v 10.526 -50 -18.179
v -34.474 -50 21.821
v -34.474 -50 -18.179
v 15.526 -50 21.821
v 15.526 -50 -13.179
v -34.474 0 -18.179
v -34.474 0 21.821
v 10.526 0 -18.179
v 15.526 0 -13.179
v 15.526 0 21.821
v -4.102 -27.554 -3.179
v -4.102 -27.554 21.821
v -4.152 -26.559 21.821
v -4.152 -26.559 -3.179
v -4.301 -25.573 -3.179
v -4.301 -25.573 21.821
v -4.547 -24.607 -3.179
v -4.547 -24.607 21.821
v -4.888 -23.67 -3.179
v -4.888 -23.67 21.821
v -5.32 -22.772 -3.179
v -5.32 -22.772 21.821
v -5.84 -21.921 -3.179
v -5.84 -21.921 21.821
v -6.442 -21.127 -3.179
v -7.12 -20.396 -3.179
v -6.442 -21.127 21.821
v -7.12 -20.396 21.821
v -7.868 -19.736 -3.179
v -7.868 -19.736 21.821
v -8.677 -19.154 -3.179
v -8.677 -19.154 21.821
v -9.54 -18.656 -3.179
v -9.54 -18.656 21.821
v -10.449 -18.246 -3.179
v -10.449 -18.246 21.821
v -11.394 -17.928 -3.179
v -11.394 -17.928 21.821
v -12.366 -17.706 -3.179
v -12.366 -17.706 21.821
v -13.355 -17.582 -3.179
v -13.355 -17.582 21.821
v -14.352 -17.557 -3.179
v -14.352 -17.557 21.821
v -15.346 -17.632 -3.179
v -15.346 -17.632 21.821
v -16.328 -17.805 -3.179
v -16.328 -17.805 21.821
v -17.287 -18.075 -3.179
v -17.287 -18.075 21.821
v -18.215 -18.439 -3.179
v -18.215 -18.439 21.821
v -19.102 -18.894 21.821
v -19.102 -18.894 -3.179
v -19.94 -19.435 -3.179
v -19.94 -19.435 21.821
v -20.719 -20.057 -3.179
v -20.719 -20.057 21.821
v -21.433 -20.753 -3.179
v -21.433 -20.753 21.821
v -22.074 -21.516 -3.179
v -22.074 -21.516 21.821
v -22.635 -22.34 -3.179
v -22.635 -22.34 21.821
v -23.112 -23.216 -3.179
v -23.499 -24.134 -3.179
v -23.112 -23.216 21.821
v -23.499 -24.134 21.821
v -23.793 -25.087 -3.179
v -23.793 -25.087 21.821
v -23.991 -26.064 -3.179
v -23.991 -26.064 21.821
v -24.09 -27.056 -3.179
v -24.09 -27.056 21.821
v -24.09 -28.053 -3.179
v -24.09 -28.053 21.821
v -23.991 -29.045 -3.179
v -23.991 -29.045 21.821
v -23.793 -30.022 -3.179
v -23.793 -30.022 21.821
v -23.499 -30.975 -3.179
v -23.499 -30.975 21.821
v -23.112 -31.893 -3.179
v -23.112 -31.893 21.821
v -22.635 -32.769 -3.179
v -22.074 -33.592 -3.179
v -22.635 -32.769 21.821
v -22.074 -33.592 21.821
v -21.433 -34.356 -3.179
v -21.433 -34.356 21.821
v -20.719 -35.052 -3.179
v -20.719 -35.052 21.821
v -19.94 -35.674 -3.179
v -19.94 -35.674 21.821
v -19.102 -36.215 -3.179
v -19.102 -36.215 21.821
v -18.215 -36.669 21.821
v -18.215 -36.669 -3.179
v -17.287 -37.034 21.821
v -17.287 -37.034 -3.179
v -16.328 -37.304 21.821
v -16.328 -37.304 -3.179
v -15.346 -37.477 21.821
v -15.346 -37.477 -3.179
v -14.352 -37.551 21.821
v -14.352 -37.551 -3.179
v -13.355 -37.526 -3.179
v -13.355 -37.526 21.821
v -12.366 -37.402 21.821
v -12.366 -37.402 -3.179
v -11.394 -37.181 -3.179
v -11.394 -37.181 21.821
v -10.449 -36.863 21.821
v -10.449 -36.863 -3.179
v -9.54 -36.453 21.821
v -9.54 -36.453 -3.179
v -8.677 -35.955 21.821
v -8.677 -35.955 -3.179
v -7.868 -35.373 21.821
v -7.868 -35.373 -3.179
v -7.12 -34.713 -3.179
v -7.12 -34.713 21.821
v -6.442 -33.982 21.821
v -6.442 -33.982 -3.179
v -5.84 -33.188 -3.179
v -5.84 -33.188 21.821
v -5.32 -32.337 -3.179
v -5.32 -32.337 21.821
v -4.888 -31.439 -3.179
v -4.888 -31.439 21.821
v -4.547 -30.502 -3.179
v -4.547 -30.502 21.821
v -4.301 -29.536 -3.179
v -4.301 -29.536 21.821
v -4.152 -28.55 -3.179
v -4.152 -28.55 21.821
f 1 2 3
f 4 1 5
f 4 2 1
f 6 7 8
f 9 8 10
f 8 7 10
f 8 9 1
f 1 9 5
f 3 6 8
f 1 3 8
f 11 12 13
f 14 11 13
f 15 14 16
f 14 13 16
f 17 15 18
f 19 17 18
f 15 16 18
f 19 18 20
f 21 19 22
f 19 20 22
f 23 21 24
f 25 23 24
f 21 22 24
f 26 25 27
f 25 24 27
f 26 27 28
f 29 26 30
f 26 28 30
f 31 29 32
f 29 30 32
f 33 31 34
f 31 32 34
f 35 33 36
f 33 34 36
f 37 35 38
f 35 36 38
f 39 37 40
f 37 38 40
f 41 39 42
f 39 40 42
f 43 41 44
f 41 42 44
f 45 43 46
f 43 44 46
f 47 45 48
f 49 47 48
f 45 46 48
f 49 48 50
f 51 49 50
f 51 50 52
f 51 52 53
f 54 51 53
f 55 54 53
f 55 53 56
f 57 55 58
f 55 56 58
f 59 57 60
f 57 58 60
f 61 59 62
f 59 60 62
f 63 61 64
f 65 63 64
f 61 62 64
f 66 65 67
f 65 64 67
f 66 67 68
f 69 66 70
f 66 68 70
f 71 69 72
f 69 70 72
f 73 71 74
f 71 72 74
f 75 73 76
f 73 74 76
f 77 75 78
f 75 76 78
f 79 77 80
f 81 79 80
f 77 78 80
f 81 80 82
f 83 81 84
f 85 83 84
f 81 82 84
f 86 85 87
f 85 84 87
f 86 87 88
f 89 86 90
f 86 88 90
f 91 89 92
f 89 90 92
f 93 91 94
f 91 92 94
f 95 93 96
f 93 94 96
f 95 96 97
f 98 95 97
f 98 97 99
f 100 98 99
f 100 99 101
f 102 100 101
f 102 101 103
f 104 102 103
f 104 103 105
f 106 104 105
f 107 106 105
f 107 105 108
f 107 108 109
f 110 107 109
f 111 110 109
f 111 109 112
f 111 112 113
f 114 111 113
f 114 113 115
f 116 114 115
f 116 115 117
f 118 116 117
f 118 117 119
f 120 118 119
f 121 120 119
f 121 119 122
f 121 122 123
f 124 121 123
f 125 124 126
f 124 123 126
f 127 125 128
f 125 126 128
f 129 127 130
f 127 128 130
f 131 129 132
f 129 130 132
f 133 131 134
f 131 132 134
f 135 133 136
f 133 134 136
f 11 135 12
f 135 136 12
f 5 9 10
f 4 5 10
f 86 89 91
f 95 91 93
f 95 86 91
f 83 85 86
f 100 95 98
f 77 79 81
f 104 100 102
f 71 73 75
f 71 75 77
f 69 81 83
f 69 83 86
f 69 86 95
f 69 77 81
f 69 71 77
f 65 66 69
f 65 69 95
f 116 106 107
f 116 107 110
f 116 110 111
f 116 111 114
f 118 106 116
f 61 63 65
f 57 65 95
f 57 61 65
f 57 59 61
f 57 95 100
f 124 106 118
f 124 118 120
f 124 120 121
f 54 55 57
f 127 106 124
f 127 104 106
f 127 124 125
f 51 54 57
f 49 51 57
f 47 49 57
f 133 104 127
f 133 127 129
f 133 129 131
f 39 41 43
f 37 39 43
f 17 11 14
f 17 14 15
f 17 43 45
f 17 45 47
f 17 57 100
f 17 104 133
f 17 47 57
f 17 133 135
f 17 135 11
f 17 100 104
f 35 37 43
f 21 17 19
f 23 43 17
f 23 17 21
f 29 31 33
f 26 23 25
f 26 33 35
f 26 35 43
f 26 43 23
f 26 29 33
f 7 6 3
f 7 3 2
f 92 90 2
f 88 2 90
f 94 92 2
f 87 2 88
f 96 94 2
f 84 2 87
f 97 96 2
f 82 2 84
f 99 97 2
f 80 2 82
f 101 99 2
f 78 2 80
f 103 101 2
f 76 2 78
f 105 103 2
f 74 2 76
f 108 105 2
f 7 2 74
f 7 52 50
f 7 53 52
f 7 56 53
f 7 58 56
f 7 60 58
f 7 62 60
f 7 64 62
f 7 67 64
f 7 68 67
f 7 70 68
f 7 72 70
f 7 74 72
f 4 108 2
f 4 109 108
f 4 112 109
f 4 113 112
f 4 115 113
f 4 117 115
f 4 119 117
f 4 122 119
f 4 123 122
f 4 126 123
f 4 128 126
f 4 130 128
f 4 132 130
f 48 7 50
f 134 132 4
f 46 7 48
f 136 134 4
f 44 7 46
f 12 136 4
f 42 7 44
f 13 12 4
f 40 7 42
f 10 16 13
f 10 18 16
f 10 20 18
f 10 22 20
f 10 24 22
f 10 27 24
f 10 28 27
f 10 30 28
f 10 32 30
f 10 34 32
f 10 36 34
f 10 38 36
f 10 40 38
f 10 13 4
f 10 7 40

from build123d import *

# Parameters (mm, degrees)
F0_W     = 50
F0_H     = 40
F1_DEPTH = 50
F2_R     = 10
F3_DEPTH = 25
F4_SIZE  = 5


with BuildPart() as f1:
    # F0 (on Front) → F1 (new body)
    with BuildSketch(Plane.XZ):
        with Locations((-9.473613, 1.82123)):
            Rectangle(F0_W, F0_H)
    extrude(amount=F1_DEPTH)

    # F2 (on face) → F3 (cut)
    with BuildSketch(Plane.XY.offset(21.82123)):
        with Locations((-14.10244, -27.554378)):
            Circle(F2_R)
    extrude(amount=-F3_DEPTH, mode=Mode.SUBTRACT)

    # F4
    f4_edges = [f1.edges().sort_by_distance(p)[0] for p in [
        (15.526387, -25, -18.17877),
    ]]
    chamfer(f4_edges, length=F4_SIZE)


solid = f1.part
